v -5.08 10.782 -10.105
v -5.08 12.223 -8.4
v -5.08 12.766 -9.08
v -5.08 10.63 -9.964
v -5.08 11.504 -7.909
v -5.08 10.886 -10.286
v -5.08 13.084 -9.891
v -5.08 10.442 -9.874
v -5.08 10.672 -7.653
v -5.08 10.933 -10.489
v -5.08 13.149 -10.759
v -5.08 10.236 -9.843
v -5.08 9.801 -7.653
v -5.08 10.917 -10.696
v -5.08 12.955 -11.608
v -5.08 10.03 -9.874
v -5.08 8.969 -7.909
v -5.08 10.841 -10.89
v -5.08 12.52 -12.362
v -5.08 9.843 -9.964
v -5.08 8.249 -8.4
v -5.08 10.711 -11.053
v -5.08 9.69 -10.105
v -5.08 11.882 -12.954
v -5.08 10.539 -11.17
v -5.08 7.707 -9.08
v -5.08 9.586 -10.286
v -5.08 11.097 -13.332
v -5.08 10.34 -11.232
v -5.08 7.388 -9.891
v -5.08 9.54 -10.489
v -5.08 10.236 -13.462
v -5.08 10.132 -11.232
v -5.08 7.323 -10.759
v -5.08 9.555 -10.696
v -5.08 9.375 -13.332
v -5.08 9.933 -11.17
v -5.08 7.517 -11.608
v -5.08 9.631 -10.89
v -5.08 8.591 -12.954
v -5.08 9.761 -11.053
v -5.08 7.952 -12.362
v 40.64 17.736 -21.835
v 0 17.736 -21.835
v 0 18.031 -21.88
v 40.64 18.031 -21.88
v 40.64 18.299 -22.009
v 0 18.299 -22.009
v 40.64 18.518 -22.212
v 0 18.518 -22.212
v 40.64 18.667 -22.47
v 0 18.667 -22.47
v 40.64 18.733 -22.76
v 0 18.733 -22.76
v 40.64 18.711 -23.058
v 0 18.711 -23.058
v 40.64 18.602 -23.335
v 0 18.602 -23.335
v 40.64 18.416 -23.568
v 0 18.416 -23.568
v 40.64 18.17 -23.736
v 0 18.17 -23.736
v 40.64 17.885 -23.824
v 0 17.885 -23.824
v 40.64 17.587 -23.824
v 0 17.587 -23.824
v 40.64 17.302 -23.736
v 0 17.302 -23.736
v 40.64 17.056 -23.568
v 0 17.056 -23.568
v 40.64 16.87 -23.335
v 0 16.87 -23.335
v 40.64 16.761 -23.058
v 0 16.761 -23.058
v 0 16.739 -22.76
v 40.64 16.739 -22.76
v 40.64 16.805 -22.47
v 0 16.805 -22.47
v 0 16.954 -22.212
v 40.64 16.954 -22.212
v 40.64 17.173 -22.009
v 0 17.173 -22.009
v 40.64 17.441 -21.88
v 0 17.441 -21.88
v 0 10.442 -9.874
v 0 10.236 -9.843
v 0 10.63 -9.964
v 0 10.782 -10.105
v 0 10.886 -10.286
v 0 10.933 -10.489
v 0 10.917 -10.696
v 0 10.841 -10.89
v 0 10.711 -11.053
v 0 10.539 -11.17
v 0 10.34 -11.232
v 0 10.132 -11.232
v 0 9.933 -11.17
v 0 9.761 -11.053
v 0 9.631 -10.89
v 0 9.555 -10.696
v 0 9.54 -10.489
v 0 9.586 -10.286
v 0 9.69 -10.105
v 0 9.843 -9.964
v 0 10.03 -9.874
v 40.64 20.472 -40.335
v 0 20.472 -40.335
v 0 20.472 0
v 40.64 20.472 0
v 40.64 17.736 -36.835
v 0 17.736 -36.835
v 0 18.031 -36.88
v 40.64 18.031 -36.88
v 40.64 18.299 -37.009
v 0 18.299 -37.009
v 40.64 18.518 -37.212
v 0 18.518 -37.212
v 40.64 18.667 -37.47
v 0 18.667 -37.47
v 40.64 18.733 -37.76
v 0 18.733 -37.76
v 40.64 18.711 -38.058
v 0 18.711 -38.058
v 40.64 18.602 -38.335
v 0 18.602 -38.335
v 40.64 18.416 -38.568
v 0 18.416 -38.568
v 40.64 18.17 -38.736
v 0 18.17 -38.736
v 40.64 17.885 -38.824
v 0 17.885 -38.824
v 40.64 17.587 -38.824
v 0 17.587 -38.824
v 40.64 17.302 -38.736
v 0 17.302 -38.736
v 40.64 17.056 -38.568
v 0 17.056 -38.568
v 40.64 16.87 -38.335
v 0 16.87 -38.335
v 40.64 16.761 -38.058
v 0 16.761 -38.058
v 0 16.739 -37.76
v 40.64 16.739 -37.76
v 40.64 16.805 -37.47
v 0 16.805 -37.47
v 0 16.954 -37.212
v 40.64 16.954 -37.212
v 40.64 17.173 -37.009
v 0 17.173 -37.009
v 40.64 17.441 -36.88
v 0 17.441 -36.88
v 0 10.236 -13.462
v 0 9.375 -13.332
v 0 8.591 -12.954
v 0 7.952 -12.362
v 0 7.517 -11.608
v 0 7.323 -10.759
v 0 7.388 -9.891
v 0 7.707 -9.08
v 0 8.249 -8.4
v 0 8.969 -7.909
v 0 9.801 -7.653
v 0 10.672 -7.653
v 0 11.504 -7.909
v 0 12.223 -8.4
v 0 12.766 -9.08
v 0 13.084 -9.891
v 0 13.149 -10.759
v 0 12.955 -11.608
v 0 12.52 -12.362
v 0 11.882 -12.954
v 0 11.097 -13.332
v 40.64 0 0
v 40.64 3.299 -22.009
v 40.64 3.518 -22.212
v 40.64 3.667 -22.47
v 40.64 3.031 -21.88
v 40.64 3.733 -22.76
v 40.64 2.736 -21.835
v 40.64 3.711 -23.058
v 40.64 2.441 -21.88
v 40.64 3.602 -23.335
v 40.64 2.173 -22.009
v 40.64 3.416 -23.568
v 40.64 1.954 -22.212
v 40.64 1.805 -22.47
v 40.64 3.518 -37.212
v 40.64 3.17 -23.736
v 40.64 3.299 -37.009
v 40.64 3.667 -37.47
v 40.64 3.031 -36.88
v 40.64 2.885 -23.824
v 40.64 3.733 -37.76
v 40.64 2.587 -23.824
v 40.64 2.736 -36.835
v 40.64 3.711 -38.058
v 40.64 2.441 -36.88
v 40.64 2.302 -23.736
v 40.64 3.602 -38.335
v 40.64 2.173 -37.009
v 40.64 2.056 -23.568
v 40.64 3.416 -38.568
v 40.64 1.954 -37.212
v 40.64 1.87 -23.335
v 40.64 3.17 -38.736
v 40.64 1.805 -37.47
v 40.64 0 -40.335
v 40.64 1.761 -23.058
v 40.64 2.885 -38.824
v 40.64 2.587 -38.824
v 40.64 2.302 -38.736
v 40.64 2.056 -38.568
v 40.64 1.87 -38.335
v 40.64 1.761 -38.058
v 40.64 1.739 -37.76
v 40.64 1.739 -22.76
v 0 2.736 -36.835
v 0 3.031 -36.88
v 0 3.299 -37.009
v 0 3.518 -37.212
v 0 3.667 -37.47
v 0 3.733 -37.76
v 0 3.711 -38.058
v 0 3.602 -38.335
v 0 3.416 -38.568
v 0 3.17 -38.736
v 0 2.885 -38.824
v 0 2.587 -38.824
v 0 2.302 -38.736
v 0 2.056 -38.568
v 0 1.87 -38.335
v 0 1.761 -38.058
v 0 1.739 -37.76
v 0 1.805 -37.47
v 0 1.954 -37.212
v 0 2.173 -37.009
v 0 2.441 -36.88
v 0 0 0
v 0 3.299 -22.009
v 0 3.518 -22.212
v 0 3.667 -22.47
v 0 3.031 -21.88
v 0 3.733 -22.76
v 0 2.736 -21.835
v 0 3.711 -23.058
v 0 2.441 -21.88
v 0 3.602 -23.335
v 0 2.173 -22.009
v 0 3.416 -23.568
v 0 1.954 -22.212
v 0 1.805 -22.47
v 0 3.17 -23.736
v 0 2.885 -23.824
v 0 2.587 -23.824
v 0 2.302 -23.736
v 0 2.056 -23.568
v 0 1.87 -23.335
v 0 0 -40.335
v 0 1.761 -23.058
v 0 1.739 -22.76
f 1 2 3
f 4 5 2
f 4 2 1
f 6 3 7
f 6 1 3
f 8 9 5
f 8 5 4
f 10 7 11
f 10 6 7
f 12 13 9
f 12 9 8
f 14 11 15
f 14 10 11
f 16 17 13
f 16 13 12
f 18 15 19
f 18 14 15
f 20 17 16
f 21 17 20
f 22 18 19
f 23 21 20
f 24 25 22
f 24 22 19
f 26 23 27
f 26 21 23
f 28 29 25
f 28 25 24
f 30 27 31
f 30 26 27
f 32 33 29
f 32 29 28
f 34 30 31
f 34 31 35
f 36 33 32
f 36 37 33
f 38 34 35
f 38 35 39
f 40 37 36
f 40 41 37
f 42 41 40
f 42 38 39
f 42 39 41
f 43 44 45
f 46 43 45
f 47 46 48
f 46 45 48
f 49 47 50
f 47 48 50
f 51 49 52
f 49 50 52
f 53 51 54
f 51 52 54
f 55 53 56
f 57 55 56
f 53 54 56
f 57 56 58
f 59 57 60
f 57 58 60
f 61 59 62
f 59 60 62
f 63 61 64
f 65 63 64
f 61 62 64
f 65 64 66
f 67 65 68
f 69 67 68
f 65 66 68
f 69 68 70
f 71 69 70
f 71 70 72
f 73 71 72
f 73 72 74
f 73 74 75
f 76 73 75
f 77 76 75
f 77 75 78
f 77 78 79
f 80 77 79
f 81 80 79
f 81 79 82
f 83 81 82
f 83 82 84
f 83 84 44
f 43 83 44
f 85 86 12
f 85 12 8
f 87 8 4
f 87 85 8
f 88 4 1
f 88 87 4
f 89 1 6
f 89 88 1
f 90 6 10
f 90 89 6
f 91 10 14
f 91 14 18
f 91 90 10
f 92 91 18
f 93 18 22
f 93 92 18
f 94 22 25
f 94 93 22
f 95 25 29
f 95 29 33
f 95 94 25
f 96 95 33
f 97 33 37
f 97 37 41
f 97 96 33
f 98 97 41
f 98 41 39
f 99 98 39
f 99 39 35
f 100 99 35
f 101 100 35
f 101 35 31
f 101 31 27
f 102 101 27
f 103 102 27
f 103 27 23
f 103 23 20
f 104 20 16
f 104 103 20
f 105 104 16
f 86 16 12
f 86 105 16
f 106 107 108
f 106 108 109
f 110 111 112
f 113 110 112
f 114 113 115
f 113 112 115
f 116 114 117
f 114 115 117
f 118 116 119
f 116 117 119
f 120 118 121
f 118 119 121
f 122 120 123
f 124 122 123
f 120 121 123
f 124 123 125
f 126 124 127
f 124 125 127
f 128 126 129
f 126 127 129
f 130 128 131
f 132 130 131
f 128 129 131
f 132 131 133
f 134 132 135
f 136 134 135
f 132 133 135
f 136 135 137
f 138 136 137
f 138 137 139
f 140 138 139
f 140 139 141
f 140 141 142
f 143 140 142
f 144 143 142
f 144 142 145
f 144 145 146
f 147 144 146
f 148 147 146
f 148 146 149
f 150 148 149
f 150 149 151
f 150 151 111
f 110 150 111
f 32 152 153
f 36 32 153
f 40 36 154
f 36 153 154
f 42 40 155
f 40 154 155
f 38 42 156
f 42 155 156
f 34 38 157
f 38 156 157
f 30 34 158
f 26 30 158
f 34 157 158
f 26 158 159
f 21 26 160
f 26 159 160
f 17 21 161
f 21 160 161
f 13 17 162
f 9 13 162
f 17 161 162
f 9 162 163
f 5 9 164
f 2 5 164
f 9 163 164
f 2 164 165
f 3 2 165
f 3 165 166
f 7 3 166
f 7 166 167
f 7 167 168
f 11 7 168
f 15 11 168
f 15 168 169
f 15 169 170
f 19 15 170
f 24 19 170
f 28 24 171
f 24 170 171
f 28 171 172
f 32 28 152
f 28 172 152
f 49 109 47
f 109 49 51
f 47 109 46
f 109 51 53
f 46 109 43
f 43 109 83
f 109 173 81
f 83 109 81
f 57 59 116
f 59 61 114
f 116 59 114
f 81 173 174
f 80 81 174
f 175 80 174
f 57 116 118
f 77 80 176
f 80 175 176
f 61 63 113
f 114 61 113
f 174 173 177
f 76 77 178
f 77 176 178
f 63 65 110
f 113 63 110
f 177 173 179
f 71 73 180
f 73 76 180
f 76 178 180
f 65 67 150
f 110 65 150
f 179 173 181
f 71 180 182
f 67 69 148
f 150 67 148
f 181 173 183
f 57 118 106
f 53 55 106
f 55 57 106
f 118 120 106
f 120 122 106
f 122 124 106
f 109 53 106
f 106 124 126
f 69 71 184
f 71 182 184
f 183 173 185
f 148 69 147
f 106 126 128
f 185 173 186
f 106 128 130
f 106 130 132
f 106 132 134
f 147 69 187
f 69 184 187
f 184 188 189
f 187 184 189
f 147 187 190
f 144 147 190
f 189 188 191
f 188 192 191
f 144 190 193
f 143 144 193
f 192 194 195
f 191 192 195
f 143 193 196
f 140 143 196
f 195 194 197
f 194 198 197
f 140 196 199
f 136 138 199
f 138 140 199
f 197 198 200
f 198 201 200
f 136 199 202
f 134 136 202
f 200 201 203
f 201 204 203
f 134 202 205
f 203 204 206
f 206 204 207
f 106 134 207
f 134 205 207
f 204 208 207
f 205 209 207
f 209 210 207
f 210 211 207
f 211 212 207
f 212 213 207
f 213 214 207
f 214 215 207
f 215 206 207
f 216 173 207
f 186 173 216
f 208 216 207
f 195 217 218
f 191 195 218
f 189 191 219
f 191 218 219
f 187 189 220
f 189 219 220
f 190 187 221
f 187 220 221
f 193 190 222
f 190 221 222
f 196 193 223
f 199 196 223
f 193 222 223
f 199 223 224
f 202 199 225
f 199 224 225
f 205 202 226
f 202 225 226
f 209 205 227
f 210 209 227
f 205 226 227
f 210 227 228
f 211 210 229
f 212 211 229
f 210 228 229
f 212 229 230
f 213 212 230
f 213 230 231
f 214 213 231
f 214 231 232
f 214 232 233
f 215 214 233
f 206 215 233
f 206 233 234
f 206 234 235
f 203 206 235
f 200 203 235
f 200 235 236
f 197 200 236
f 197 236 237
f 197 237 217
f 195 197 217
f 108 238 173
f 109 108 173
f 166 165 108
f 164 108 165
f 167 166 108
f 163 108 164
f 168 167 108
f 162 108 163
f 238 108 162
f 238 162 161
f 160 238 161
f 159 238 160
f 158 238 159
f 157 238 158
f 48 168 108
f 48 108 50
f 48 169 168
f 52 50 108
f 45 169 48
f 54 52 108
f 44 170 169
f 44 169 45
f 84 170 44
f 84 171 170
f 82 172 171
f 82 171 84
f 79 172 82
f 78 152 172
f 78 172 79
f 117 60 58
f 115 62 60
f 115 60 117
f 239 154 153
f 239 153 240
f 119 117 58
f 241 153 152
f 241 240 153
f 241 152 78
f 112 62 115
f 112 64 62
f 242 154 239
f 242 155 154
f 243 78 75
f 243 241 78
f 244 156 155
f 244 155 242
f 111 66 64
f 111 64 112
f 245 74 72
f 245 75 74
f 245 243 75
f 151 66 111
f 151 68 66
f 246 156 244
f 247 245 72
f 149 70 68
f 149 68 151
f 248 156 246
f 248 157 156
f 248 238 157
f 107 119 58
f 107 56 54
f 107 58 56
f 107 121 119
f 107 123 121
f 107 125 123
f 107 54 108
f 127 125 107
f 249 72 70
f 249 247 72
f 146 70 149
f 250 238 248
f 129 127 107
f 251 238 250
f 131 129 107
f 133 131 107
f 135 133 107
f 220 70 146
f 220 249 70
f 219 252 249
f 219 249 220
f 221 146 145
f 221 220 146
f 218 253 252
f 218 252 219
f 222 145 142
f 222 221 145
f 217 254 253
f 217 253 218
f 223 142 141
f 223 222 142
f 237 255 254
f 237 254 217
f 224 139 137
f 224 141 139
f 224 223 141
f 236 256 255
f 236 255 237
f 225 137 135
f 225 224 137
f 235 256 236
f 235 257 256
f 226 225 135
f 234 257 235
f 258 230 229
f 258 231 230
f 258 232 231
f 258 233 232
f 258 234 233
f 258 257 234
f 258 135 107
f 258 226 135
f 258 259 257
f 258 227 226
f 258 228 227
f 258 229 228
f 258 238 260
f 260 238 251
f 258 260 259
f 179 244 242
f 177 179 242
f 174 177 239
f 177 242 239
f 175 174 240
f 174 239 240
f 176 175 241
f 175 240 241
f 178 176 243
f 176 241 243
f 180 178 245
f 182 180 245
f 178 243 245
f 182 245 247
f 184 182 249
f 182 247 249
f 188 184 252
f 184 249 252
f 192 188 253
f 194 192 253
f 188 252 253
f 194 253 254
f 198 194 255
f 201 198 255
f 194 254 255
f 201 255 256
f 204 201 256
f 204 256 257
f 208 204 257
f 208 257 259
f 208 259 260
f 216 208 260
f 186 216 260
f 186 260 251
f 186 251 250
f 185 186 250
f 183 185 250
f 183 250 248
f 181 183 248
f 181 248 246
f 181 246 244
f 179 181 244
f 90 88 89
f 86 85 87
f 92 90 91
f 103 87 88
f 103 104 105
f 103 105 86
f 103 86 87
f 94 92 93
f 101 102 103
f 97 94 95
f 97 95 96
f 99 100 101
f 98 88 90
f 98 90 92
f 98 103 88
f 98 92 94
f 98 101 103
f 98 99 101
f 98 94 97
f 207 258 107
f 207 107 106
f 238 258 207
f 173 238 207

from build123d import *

# Parameters (mm, degrees)
SKETCH1_W           = 40.64
SKETCH1_H           = 40.3352
BOSS_EXTRUDE1_DEPTH = 20.4724
SKETCH3_R           = 2.921
SKETCH3_R_2         = 0.6985
BOSS_EXTRUDE2_DEPTH = 5.08
SKETCH4_R           = 1
CUT_EXTRUDE1_DEPTH  = 61.808363905


with BuildPart() as part:
    # Sketch1 → Boss-Extrude1 (new body)
    with BuildSketch(Plane(origin=(0, 0, 0), x_dir=(1, 0, 0), z_dir=(0, 1, 0))):
        with Locations((20.32, 20.1676)):
            Rectangle(SKETCH1_W, SKETCH1_H)
    extrude(amount=BOSS_EXTRUDE1_DEPTH)

    # Sketch3 → Boss-Extrude2 (add)
    with BuildSketch(Plane.ZY):
        with Locations(Location((-10.541, 10.2362, 0), (0, 0, 180))):
            Circle(SKETCH3_R)
        with Locations((-10.541, 10.2362)):
            Circle(SKETCH3_R_2, mode=Mode.SUBTRACT)
    extrude(amount=BOSS_EXTRUDE2_DEPTH)

    # Sketch4 → Cut-Extrude1 (cut, through all)
    with BuildSketch(Plane.ZY):
        with Locations((-37.8352, 17.736)):
            Circle(SKETCH4_R)
        with Locations((-37.8352, 2.736)):
            Circle(SKETCH4_R)
        with Locations((-22.8352, 17.736)):
            Circle(SKETCH4_R)
        with Locations((-22.8352, 2.736)):
            Circle(SKETCH4_R)
    extrude(amount=-CUT_EXTRUDE1_DEPTH, mode=Mode.SUBTRACT)


solid = part.part
